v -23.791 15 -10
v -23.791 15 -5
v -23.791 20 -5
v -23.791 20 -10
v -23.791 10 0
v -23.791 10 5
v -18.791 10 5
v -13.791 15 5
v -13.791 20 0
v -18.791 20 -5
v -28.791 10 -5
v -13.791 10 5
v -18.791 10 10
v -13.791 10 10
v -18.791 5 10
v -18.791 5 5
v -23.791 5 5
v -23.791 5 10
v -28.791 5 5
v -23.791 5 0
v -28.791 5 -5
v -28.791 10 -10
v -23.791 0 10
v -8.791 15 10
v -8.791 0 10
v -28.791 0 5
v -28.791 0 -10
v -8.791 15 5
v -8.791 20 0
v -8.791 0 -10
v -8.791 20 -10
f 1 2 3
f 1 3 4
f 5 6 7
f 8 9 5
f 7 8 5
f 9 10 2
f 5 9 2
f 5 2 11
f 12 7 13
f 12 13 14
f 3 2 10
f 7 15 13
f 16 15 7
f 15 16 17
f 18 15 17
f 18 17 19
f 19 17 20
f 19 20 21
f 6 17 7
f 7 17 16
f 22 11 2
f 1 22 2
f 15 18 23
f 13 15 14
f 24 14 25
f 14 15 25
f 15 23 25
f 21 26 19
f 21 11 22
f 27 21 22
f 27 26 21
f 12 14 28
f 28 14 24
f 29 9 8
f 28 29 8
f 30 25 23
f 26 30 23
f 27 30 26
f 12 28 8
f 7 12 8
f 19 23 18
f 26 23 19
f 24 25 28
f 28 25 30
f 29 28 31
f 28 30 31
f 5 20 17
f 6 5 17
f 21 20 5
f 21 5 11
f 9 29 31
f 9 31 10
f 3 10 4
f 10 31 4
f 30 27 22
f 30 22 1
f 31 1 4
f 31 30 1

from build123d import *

# Parameters (mm, degrees)
BOSS_EXTRUDE1_DEPTH = 20
SKETCH2_W           = 5
SKETCH2_H           = 20
BOSS_EXTRUDE2_DEPTH = 5
CUT_EXTRUDE1_DEPTH  = 5
SKETCH4_W           = 5
SKETCH4_H           = 15
BOSS_EXTRUDE4_DEPTH = 5
CUT_EXTRUDE3_DEPTH  = 5
SKETCH7_W           = 5
SKETCH7_H           = 15
BOSS_EXTRUDE5_DEPTH = 5
CUT_EXTRUDE4_DEPTH  = 5
BOSS_EXTRUDE6_DEPTH = 20
CUT_EXTRUDE15_DEPTH = 61
BOSS_EXTRUDE7_DEPTH = 5
SKETCH11_W          = 5
SKETCH11_H          = 5
BOSS_EXTRUDE8_DEPTH = 5


with BuildPart() as part:
    # Sketch1 → Boss-Extrude1 (new body)
    with BuildSketch(Plane(origin=(0, 0, 0), x_dir=(1, 0, 0), z_dir=(0, 1, 0))):
        Polygon((-23.791469194, 10), (-8.791469194, 10), (-8.791469194, 0), (-13.791469194, 0), (-18.791469194, 5), (-23.791469194, 5), align=None)
    extrude(amount=BOSS_EXTRUDE1_DEPTH)

    # Sketch2 → Boss-Extrude2 (add)
    with BuildSketch(Plane.XY):
        with Locations((-11.291469194, 10)):
            Rectangle(SKETCH2_W, SKETCH2_H)
    extrude(amount=BOSS_EXTRUDE2_DEPTH)

    # Sketch3 → Cut-Extrude1 (cut)
    with BuildSketch(Plane.ZY.offset(13.791469194)):
        Polygon((0, 20), (5, 15), (5, 20), align=None)
    extrude(amount=-CUT_EXTRUDE1_DEPTH, mode=Mode.SUBTRACT)

    # Sketch4 → Boss-Extrude4 (add)
    with BuildSketch(Plane.ZY.offset(23.791469194)):
        with Locations((-7.5, 7.5)):
            Rectangle(SKETCH4_W, SKETCH4_H)
    extrude(amount=BOSS_EXTRUDE4_DEPTH)

    # Sketch6 → Cut-Extrude3 (cut)
    with BuildSketch(Plane.XY.offset(-5)):
        Polygon((-23.791469194, 15), (-28.791469194, 15), (-28.791469194, 10), align=None)
    extrude(amount=-CUT_EXTRUDE3_DEPTH, mode=Mode.SUBTRACT)

    # Sketch7 → Boss-Extrude5 (add)
    with BuildSketch(Plane.XY.offset(5)):
        with Locations((-11.291469194, 7.5)):
            Rectangle(SKETCH7_W, SKETCH7_H)
    extrude(amount=BOSS_EXTRUDE5_DEPTH)

    # Sketch8 → Cut-Extrude4 (cut)
    with BuildSketch(Plane.XY.offset(10)):
        Polygon((-8.791469194, 15), (-13.791469194, 15), (-13.791469194, 10), align=None)
    extrude(amount=-CUT_EXTRUDE4_DEPTH, mode=Mode.SUBTRACT)

    # Sketch9 → Boss-Extrude6 (add)
    with BuildSketch(Plane(origin=(0, 0, 0), x_dir=(-1, 0, 0), z_dir=(0, -1, 0))):
        Polygon((28.791469194, 5), (18.791469194, 5), (13.791469194, 0), (13.791469194, -5), (18.791469194, -5), align=None)
    extrude(amount=-BOSS_EXTRUDE6_DEPTH)

    # 3DSketch1 → Cut-Extrude15 (cut, along a direction that is not the sketch's normal)
    with BuildSketch(Plane(origin=(-28.791469194, 10, -5), x_dir=(0.8017837257372719, 0.2672612419124303, 0.5345224838248478), z_dir=(-0.5773502691896281, 0.5773502691896282, 0.5773502691896213))):
        Polygon((0, 0), (10.690449676, 9.258200998), (17.371980724, 6.943650748), (18.708286934, 0), (13.363062096, -4.629100499), align=None)
    extrude(amount=CUT_EXTRUDE15_DEPTH, dir=(0, 1, 0), mode=Mode.SUBTRACT)

    # Sketch10 → Boss-Extrude7 (add)
    with BuildSketch(Plane(origin=(0, 0, 0), x_dir=(-1, 0, 0), z_dir=(0, -1, 0))):
        Polygon((28.791469194, 5), (18.791469194, -5), (13.791469194, -5), (13.791469194, -10), (23.791469194, -10), (28.791469194, -5), align=None)
    extrude(amount=-BOSS_EXTRUDE7_DEPTH)

    # Sketch11 → Boss-Extrude8 (add)
    with BuildSketch(Plane(origin=(0, 5, 0), x_dir=(1, 0, 0), z_dir=(0, 1, 0))):
        with Locations((-16.291469194, -7.5)):
            Rectangle(SKETCH11_W, SKETCH11_H)
        Polygon((-23.791469194, -5), (-18.791469194, -5), (-23.791469194, 0), align=None)
    extrude(amount=BOSS_EXTRUDE8_DEPTH)


solid = part.part
